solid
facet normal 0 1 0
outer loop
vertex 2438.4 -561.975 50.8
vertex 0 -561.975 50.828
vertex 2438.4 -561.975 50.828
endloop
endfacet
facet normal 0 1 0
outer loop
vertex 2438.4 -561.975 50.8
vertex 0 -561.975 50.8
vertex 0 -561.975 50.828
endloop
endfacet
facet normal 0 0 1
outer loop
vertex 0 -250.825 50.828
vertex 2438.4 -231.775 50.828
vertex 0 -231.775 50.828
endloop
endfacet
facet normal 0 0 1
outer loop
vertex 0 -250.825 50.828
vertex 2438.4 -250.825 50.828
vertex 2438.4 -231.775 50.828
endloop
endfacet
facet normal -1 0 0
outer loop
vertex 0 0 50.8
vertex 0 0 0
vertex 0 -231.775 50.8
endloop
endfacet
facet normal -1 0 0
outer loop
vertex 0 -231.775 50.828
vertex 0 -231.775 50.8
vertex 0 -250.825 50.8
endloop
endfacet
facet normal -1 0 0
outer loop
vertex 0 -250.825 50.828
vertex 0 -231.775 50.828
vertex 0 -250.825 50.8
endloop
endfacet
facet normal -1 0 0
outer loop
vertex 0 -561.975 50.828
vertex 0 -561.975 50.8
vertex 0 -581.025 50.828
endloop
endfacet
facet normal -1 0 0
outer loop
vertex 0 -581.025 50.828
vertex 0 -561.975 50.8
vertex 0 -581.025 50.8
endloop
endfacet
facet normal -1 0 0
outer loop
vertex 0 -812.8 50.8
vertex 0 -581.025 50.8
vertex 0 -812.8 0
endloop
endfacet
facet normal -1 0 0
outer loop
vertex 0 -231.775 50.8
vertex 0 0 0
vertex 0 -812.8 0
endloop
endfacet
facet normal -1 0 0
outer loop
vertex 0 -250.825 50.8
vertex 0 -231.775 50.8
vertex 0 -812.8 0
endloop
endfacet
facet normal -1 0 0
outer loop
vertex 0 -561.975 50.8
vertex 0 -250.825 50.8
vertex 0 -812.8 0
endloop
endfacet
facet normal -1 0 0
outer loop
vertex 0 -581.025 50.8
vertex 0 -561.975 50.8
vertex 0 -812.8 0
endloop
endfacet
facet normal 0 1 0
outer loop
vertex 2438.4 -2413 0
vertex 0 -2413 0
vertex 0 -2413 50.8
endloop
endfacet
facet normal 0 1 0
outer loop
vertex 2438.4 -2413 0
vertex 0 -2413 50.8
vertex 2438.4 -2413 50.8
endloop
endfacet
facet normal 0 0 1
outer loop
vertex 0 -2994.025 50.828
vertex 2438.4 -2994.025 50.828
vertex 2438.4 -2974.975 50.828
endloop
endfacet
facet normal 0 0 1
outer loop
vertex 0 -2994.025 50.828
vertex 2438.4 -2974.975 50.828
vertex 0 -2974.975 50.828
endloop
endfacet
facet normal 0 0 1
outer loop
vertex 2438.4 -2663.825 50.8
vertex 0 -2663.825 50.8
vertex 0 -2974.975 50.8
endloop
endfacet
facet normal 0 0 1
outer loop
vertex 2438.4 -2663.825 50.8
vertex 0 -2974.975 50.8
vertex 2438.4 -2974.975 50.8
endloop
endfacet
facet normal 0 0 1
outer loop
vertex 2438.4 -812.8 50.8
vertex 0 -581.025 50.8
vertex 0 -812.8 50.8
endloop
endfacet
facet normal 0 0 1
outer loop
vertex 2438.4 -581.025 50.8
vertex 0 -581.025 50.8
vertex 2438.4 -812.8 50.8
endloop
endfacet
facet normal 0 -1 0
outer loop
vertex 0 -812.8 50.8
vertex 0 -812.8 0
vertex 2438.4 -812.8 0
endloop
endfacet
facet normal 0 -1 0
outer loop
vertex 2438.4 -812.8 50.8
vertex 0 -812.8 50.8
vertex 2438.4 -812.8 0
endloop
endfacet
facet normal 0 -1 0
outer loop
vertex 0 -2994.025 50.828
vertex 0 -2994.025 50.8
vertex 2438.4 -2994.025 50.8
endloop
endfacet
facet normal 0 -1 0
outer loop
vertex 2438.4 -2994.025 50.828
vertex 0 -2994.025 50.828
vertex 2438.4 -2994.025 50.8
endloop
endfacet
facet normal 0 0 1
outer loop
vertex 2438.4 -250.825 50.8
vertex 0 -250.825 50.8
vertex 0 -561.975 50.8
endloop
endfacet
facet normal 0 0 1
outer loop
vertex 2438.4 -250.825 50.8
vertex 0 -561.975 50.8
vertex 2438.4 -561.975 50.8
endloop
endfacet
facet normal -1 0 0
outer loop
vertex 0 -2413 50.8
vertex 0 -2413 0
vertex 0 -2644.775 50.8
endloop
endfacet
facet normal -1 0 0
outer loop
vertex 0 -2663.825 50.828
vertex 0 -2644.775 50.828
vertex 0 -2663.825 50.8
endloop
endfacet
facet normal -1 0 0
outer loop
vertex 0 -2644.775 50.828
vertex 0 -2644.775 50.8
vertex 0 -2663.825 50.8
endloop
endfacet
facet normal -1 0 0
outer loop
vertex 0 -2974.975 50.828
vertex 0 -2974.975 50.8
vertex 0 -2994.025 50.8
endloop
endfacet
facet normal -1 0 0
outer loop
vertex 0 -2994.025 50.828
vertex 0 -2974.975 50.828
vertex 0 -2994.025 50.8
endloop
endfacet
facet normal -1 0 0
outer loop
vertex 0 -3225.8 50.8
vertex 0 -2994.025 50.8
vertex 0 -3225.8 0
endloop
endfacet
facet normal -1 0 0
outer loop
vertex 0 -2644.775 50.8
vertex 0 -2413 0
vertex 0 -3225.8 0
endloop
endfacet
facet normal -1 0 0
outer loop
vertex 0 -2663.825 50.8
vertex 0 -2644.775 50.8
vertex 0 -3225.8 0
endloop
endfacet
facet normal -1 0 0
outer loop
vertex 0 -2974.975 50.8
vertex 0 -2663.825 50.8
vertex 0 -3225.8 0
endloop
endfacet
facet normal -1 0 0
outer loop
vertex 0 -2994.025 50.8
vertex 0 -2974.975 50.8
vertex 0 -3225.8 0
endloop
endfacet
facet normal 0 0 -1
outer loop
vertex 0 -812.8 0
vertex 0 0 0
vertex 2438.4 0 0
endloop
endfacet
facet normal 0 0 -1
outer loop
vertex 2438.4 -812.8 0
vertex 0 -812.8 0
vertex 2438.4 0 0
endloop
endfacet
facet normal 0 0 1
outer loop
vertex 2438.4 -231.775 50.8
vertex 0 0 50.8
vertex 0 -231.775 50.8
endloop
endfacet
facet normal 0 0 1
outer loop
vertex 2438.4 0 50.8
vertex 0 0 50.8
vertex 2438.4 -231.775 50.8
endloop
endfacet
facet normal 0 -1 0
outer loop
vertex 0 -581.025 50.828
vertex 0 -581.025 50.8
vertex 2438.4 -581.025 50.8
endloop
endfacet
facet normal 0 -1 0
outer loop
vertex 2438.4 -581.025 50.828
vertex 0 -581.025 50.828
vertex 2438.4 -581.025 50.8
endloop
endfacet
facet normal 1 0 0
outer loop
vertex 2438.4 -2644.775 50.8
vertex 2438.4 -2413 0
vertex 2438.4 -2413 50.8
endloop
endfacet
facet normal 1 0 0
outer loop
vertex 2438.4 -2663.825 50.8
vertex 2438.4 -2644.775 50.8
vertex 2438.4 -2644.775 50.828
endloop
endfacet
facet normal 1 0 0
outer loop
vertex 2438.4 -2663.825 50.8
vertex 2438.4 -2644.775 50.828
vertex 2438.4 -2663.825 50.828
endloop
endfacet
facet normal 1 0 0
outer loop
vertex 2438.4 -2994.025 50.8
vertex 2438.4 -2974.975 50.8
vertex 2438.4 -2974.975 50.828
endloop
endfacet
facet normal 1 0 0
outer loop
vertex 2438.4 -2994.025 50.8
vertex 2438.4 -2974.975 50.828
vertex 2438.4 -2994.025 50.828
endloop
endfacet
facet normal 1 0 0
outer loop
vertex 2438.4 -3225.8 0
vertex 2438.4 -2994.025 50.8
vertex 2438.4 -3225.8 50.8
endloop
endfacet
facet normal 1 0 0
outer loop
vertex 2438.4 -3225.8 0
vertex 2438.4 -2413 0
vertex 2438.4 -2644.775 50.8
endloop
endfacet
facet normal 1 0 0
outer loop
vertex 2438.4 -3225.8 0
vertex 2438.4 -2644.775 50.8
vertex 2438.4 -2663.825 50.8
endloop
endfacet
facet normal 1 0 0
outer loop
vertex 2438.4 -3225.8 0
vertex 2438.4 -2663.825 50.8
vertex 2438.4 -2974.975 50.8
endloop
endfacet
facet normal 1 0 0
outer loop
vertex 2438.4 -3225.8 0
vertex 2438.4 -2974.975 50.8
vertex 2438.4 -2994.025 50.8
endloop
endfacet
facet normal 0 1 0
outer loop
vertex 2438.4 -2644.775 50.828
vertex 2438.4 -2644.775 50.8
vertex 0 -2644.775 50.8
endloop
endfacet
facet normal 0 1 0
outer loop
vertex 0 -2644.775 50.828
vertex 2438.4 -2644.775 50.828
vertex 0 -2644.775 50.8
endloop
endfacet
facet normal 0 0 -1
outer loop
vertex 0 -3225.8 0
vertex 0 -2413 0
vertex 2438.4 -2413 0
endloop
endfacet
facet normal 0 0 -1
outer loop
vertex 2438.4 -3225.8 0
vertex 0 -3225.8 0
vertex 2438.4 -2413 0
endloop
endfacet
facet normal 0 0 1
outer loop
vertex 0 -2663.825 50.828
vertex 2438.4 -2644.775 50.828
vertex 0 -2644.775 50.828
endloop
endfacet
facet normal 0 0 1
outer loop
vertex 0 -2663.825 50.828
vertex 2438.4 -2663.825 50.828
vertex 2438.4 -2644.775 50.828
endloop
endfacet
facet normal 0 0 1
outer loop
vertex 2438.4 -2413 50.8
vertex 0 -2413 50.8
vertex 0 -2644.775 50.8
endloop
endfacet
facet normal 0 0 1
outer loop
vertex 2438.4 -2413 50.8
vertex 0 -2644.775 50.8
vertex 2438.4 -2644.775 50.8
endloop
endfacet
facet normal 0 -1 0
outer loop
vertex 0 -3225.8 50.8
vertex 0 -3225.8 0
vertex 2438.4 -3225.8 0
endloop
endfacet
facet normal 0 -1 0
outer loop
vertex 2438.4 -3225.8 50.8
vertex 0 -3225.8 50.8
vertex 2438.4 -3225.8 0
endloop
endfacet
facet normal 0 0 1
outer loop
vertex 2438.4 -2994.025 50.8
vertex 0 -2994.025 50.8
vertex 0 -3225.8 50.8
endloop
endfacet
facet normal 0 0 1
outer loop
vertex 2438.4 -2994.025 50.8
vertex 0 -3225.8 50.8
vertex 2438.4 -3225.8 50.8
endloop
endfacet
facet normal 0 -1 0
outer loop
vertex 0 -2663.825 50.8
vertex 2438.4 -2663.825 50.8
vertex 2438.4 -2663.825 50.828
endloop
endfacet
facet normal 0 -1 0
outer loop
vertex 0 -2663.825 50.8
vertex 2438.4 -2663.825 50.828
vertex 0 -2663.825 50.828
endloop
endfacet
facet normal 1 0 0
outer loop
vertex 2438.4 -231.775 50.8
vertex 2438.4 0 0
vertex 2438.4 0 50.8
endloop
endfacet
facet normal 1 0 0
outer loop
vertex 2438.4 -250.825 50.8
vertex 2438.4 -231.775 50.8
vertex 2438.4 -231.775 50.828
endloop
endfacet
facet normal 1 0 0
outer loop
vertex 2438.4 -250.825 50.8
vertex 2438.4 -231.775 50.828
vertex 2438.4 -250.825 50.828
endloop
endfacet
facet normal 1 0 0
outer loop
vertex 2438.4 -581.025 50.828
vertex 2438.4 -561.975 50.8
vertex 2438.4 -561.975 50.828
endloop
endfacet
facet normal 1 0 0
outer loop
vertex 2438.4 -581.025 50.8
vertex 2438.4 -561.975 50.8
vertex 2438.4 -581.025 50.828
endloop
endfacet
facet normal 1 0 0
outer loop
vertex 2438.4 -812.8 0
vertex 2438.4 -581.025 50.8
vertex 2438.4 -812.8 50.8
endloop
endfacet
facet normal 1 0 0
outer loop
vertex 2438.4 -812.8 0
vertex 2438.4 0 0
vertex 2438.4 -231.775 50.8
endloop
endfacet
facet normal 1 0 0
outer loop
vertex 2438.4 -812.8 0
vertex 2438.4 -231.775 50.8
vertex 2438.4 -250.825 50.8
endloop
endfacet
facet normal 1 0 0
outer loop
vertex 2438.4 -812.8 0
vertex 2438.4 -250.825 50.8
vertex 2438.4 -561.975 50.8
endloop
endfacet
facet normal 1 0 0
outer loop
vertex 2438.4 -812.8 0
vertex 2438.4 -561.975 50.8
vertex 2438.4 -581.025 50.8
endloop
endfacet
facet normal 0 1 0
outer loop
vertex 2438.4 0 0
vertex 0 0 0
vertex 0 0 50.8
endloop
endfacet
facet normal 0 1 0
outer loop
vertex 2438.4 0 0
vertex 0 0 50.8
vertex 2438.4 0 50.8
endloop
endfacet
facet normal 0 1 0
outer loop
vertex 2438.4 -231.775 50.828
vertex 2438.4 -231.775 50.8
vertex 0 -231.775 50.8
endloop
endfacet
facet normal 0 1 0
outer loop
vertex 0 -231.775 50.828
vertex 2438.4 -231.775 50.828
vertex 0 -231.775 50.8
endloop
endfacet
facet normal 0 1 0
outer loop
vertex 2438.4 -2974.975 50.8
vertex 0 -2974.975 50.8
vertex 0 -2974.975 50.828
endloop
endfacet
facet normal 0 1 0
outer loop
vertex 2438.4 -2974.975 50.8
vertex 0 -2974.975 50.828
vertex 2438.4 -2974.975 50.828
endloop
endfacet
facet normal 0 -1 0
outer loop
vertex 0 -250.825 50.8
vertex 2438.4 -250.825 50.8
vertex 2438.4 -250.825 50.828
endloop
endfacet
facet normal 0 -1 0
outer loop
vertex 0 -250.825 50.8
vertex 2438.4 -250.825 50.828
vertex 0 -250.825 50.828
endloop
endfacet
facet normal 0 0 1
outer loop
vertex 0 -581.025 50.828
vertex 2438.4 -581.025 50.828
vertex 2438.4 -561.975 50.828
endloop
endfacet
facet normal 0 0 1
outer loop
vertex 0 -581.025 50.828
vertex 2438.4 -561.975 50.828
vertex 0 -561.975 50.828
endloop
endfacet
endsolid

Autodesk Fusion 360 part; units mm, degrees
sketch "Sketch1" plane through (0, 0, 0) normal (0, 0, 1) x (1, 0, 0)
  line L0 (0, 0) -> (0, -812.8)
  line L1 (0, -812.8) -> (0, -2413)
  line L2 (0, -2413) -> (0, -3225.8)
  line L3 (0, 0) -> (1219.2, 0)
  line L4 (1219.2, 0) -> (0, 0)
  line L5 (0, 0) -> (0, -812.8)
  line L6 (0, -812.8) -> (1219.2, -812.8)
  line L7 (1219.2, -812.8) -> (1219.2, 0)
  line L8 (0, -3225.8) -> (1219.2, -3225.8)
  line L9 (1219.2, -3225.8) -> (0, -3225.8)
  line L10 (0, -3225.8) -> (0, -2413)
  line L11 (0, -2413) -> (1219.2, -2413)
  line L12 (1219.2, -2413) -> (1219.2, -3225.8)
  line L13 (1219.2, -812.8) -> (1219.2, 0)
  line L14 (1219.2, 0) -> (2438.4, 0)
  line L15 (2438.4, 0) -> (2438.4, -812.8)
  line L16 (2438.4, -812.8) -> (1219.2, -812.8)
  line L17 (1219.2, -3225.8) -> (1219.2, -2413)
  line L18 (1219.2, -2413) -> (2438.4, -2413)
  line L19 (2438.4, -2413) -> (2438.4, -3225.8)
  line L20 (2438.4, -3225.8) -> (1219.2, -3225.8)
  dimension "d1" = 812.8
  dimension "d2" = 1600.2
  dimension "d3" = 812.8
  dimension "d4" = 1219.2
  dimension "d5" = 1219.2
  dimension "d8" = 1219.2
  dimension "d9" = 1219.2
extrude "Extrude2" add sketch "Sketch1" along normal blind 50.8 makes body 1 at (812.8, -270.9333, 0) makes body 2 at (812.8, -2954.8667, 0)
sketch "Sketch2" plane through (0, 0, 50.8) normal (0, 0, 1) x (-1, 0, 0)
  line L0 (-2438.4, 0) -> (0, 0)
  line L1 (0, 0) -> (0, 812.8)
  line L2 (0, 812.8) -> (-2438.4, 812.8)
  line L3 (-2438.4, 812.8) -> (-2438.4, 0)
  line L4 (-2438.4, 250.825) -> (0, 250.825)
  line L5 (-2438.4, 231.775) -> (0, 231.775)
  line L6 (0, 561.975) -> (-2438.4, 561.975)
  line L7 (0, 581.025) -> (-2438.4, 581.025)
  dimension "d12" = -250.825
  dimension "d13" = -231.775
  dimension "d14" = -250.825
  dimension "d15" = -231.775
extrude "Extrude3" add sketch "Sketch2" along normal blind 0.0279 contours L1 L3 L4 L5 | L1 L3 L6 L7 bodies 1
sketch "Sketch3" plane through (0, 0, 50.8) normal (0, 0, 1) x (-1, 0, 0)
  line L0 (-2438.4, 3225.8) -> (-2438.4, 2413)
  line L1 (-2438.4, 2413) -> (0, 2413)
  line L2 (0, 2413) -> (0, 3225.8)
  line L3 (0, 3225.8) -> (-2438.4, 3225.8)
  line L4 (-2438.4, 2663.825) -> (0, 2663.825)
  line L5 (-2438.4, 2644.775) -> (0, 2644.775)
  line L6 (0, 2974.975) -> (-2438.4, 2974.975)
  line L7 (0, 2994.025) -> (-2438.4, 2994.025)
  dimension "d18" = -250.825
  dimension "d19" = -231.775
  dimension "d20" = -250.825
  dimension "d21" = -231.775
extrude "Extrude4" add sketch "Sketch3" along normal blind 0.0279 contours L0 L2 L6 L7 | L0 L2 L4 L5 bodies 2
equation "d4 = ( 24 * 2 ) * 1 in"
equation "d5 = ( 24 * 2 ) * 1 in"
equation "d8 = ( 24 * 2 ) * 1 in"
equation "d9 = ( 24 * 2 ) * 1 in"
